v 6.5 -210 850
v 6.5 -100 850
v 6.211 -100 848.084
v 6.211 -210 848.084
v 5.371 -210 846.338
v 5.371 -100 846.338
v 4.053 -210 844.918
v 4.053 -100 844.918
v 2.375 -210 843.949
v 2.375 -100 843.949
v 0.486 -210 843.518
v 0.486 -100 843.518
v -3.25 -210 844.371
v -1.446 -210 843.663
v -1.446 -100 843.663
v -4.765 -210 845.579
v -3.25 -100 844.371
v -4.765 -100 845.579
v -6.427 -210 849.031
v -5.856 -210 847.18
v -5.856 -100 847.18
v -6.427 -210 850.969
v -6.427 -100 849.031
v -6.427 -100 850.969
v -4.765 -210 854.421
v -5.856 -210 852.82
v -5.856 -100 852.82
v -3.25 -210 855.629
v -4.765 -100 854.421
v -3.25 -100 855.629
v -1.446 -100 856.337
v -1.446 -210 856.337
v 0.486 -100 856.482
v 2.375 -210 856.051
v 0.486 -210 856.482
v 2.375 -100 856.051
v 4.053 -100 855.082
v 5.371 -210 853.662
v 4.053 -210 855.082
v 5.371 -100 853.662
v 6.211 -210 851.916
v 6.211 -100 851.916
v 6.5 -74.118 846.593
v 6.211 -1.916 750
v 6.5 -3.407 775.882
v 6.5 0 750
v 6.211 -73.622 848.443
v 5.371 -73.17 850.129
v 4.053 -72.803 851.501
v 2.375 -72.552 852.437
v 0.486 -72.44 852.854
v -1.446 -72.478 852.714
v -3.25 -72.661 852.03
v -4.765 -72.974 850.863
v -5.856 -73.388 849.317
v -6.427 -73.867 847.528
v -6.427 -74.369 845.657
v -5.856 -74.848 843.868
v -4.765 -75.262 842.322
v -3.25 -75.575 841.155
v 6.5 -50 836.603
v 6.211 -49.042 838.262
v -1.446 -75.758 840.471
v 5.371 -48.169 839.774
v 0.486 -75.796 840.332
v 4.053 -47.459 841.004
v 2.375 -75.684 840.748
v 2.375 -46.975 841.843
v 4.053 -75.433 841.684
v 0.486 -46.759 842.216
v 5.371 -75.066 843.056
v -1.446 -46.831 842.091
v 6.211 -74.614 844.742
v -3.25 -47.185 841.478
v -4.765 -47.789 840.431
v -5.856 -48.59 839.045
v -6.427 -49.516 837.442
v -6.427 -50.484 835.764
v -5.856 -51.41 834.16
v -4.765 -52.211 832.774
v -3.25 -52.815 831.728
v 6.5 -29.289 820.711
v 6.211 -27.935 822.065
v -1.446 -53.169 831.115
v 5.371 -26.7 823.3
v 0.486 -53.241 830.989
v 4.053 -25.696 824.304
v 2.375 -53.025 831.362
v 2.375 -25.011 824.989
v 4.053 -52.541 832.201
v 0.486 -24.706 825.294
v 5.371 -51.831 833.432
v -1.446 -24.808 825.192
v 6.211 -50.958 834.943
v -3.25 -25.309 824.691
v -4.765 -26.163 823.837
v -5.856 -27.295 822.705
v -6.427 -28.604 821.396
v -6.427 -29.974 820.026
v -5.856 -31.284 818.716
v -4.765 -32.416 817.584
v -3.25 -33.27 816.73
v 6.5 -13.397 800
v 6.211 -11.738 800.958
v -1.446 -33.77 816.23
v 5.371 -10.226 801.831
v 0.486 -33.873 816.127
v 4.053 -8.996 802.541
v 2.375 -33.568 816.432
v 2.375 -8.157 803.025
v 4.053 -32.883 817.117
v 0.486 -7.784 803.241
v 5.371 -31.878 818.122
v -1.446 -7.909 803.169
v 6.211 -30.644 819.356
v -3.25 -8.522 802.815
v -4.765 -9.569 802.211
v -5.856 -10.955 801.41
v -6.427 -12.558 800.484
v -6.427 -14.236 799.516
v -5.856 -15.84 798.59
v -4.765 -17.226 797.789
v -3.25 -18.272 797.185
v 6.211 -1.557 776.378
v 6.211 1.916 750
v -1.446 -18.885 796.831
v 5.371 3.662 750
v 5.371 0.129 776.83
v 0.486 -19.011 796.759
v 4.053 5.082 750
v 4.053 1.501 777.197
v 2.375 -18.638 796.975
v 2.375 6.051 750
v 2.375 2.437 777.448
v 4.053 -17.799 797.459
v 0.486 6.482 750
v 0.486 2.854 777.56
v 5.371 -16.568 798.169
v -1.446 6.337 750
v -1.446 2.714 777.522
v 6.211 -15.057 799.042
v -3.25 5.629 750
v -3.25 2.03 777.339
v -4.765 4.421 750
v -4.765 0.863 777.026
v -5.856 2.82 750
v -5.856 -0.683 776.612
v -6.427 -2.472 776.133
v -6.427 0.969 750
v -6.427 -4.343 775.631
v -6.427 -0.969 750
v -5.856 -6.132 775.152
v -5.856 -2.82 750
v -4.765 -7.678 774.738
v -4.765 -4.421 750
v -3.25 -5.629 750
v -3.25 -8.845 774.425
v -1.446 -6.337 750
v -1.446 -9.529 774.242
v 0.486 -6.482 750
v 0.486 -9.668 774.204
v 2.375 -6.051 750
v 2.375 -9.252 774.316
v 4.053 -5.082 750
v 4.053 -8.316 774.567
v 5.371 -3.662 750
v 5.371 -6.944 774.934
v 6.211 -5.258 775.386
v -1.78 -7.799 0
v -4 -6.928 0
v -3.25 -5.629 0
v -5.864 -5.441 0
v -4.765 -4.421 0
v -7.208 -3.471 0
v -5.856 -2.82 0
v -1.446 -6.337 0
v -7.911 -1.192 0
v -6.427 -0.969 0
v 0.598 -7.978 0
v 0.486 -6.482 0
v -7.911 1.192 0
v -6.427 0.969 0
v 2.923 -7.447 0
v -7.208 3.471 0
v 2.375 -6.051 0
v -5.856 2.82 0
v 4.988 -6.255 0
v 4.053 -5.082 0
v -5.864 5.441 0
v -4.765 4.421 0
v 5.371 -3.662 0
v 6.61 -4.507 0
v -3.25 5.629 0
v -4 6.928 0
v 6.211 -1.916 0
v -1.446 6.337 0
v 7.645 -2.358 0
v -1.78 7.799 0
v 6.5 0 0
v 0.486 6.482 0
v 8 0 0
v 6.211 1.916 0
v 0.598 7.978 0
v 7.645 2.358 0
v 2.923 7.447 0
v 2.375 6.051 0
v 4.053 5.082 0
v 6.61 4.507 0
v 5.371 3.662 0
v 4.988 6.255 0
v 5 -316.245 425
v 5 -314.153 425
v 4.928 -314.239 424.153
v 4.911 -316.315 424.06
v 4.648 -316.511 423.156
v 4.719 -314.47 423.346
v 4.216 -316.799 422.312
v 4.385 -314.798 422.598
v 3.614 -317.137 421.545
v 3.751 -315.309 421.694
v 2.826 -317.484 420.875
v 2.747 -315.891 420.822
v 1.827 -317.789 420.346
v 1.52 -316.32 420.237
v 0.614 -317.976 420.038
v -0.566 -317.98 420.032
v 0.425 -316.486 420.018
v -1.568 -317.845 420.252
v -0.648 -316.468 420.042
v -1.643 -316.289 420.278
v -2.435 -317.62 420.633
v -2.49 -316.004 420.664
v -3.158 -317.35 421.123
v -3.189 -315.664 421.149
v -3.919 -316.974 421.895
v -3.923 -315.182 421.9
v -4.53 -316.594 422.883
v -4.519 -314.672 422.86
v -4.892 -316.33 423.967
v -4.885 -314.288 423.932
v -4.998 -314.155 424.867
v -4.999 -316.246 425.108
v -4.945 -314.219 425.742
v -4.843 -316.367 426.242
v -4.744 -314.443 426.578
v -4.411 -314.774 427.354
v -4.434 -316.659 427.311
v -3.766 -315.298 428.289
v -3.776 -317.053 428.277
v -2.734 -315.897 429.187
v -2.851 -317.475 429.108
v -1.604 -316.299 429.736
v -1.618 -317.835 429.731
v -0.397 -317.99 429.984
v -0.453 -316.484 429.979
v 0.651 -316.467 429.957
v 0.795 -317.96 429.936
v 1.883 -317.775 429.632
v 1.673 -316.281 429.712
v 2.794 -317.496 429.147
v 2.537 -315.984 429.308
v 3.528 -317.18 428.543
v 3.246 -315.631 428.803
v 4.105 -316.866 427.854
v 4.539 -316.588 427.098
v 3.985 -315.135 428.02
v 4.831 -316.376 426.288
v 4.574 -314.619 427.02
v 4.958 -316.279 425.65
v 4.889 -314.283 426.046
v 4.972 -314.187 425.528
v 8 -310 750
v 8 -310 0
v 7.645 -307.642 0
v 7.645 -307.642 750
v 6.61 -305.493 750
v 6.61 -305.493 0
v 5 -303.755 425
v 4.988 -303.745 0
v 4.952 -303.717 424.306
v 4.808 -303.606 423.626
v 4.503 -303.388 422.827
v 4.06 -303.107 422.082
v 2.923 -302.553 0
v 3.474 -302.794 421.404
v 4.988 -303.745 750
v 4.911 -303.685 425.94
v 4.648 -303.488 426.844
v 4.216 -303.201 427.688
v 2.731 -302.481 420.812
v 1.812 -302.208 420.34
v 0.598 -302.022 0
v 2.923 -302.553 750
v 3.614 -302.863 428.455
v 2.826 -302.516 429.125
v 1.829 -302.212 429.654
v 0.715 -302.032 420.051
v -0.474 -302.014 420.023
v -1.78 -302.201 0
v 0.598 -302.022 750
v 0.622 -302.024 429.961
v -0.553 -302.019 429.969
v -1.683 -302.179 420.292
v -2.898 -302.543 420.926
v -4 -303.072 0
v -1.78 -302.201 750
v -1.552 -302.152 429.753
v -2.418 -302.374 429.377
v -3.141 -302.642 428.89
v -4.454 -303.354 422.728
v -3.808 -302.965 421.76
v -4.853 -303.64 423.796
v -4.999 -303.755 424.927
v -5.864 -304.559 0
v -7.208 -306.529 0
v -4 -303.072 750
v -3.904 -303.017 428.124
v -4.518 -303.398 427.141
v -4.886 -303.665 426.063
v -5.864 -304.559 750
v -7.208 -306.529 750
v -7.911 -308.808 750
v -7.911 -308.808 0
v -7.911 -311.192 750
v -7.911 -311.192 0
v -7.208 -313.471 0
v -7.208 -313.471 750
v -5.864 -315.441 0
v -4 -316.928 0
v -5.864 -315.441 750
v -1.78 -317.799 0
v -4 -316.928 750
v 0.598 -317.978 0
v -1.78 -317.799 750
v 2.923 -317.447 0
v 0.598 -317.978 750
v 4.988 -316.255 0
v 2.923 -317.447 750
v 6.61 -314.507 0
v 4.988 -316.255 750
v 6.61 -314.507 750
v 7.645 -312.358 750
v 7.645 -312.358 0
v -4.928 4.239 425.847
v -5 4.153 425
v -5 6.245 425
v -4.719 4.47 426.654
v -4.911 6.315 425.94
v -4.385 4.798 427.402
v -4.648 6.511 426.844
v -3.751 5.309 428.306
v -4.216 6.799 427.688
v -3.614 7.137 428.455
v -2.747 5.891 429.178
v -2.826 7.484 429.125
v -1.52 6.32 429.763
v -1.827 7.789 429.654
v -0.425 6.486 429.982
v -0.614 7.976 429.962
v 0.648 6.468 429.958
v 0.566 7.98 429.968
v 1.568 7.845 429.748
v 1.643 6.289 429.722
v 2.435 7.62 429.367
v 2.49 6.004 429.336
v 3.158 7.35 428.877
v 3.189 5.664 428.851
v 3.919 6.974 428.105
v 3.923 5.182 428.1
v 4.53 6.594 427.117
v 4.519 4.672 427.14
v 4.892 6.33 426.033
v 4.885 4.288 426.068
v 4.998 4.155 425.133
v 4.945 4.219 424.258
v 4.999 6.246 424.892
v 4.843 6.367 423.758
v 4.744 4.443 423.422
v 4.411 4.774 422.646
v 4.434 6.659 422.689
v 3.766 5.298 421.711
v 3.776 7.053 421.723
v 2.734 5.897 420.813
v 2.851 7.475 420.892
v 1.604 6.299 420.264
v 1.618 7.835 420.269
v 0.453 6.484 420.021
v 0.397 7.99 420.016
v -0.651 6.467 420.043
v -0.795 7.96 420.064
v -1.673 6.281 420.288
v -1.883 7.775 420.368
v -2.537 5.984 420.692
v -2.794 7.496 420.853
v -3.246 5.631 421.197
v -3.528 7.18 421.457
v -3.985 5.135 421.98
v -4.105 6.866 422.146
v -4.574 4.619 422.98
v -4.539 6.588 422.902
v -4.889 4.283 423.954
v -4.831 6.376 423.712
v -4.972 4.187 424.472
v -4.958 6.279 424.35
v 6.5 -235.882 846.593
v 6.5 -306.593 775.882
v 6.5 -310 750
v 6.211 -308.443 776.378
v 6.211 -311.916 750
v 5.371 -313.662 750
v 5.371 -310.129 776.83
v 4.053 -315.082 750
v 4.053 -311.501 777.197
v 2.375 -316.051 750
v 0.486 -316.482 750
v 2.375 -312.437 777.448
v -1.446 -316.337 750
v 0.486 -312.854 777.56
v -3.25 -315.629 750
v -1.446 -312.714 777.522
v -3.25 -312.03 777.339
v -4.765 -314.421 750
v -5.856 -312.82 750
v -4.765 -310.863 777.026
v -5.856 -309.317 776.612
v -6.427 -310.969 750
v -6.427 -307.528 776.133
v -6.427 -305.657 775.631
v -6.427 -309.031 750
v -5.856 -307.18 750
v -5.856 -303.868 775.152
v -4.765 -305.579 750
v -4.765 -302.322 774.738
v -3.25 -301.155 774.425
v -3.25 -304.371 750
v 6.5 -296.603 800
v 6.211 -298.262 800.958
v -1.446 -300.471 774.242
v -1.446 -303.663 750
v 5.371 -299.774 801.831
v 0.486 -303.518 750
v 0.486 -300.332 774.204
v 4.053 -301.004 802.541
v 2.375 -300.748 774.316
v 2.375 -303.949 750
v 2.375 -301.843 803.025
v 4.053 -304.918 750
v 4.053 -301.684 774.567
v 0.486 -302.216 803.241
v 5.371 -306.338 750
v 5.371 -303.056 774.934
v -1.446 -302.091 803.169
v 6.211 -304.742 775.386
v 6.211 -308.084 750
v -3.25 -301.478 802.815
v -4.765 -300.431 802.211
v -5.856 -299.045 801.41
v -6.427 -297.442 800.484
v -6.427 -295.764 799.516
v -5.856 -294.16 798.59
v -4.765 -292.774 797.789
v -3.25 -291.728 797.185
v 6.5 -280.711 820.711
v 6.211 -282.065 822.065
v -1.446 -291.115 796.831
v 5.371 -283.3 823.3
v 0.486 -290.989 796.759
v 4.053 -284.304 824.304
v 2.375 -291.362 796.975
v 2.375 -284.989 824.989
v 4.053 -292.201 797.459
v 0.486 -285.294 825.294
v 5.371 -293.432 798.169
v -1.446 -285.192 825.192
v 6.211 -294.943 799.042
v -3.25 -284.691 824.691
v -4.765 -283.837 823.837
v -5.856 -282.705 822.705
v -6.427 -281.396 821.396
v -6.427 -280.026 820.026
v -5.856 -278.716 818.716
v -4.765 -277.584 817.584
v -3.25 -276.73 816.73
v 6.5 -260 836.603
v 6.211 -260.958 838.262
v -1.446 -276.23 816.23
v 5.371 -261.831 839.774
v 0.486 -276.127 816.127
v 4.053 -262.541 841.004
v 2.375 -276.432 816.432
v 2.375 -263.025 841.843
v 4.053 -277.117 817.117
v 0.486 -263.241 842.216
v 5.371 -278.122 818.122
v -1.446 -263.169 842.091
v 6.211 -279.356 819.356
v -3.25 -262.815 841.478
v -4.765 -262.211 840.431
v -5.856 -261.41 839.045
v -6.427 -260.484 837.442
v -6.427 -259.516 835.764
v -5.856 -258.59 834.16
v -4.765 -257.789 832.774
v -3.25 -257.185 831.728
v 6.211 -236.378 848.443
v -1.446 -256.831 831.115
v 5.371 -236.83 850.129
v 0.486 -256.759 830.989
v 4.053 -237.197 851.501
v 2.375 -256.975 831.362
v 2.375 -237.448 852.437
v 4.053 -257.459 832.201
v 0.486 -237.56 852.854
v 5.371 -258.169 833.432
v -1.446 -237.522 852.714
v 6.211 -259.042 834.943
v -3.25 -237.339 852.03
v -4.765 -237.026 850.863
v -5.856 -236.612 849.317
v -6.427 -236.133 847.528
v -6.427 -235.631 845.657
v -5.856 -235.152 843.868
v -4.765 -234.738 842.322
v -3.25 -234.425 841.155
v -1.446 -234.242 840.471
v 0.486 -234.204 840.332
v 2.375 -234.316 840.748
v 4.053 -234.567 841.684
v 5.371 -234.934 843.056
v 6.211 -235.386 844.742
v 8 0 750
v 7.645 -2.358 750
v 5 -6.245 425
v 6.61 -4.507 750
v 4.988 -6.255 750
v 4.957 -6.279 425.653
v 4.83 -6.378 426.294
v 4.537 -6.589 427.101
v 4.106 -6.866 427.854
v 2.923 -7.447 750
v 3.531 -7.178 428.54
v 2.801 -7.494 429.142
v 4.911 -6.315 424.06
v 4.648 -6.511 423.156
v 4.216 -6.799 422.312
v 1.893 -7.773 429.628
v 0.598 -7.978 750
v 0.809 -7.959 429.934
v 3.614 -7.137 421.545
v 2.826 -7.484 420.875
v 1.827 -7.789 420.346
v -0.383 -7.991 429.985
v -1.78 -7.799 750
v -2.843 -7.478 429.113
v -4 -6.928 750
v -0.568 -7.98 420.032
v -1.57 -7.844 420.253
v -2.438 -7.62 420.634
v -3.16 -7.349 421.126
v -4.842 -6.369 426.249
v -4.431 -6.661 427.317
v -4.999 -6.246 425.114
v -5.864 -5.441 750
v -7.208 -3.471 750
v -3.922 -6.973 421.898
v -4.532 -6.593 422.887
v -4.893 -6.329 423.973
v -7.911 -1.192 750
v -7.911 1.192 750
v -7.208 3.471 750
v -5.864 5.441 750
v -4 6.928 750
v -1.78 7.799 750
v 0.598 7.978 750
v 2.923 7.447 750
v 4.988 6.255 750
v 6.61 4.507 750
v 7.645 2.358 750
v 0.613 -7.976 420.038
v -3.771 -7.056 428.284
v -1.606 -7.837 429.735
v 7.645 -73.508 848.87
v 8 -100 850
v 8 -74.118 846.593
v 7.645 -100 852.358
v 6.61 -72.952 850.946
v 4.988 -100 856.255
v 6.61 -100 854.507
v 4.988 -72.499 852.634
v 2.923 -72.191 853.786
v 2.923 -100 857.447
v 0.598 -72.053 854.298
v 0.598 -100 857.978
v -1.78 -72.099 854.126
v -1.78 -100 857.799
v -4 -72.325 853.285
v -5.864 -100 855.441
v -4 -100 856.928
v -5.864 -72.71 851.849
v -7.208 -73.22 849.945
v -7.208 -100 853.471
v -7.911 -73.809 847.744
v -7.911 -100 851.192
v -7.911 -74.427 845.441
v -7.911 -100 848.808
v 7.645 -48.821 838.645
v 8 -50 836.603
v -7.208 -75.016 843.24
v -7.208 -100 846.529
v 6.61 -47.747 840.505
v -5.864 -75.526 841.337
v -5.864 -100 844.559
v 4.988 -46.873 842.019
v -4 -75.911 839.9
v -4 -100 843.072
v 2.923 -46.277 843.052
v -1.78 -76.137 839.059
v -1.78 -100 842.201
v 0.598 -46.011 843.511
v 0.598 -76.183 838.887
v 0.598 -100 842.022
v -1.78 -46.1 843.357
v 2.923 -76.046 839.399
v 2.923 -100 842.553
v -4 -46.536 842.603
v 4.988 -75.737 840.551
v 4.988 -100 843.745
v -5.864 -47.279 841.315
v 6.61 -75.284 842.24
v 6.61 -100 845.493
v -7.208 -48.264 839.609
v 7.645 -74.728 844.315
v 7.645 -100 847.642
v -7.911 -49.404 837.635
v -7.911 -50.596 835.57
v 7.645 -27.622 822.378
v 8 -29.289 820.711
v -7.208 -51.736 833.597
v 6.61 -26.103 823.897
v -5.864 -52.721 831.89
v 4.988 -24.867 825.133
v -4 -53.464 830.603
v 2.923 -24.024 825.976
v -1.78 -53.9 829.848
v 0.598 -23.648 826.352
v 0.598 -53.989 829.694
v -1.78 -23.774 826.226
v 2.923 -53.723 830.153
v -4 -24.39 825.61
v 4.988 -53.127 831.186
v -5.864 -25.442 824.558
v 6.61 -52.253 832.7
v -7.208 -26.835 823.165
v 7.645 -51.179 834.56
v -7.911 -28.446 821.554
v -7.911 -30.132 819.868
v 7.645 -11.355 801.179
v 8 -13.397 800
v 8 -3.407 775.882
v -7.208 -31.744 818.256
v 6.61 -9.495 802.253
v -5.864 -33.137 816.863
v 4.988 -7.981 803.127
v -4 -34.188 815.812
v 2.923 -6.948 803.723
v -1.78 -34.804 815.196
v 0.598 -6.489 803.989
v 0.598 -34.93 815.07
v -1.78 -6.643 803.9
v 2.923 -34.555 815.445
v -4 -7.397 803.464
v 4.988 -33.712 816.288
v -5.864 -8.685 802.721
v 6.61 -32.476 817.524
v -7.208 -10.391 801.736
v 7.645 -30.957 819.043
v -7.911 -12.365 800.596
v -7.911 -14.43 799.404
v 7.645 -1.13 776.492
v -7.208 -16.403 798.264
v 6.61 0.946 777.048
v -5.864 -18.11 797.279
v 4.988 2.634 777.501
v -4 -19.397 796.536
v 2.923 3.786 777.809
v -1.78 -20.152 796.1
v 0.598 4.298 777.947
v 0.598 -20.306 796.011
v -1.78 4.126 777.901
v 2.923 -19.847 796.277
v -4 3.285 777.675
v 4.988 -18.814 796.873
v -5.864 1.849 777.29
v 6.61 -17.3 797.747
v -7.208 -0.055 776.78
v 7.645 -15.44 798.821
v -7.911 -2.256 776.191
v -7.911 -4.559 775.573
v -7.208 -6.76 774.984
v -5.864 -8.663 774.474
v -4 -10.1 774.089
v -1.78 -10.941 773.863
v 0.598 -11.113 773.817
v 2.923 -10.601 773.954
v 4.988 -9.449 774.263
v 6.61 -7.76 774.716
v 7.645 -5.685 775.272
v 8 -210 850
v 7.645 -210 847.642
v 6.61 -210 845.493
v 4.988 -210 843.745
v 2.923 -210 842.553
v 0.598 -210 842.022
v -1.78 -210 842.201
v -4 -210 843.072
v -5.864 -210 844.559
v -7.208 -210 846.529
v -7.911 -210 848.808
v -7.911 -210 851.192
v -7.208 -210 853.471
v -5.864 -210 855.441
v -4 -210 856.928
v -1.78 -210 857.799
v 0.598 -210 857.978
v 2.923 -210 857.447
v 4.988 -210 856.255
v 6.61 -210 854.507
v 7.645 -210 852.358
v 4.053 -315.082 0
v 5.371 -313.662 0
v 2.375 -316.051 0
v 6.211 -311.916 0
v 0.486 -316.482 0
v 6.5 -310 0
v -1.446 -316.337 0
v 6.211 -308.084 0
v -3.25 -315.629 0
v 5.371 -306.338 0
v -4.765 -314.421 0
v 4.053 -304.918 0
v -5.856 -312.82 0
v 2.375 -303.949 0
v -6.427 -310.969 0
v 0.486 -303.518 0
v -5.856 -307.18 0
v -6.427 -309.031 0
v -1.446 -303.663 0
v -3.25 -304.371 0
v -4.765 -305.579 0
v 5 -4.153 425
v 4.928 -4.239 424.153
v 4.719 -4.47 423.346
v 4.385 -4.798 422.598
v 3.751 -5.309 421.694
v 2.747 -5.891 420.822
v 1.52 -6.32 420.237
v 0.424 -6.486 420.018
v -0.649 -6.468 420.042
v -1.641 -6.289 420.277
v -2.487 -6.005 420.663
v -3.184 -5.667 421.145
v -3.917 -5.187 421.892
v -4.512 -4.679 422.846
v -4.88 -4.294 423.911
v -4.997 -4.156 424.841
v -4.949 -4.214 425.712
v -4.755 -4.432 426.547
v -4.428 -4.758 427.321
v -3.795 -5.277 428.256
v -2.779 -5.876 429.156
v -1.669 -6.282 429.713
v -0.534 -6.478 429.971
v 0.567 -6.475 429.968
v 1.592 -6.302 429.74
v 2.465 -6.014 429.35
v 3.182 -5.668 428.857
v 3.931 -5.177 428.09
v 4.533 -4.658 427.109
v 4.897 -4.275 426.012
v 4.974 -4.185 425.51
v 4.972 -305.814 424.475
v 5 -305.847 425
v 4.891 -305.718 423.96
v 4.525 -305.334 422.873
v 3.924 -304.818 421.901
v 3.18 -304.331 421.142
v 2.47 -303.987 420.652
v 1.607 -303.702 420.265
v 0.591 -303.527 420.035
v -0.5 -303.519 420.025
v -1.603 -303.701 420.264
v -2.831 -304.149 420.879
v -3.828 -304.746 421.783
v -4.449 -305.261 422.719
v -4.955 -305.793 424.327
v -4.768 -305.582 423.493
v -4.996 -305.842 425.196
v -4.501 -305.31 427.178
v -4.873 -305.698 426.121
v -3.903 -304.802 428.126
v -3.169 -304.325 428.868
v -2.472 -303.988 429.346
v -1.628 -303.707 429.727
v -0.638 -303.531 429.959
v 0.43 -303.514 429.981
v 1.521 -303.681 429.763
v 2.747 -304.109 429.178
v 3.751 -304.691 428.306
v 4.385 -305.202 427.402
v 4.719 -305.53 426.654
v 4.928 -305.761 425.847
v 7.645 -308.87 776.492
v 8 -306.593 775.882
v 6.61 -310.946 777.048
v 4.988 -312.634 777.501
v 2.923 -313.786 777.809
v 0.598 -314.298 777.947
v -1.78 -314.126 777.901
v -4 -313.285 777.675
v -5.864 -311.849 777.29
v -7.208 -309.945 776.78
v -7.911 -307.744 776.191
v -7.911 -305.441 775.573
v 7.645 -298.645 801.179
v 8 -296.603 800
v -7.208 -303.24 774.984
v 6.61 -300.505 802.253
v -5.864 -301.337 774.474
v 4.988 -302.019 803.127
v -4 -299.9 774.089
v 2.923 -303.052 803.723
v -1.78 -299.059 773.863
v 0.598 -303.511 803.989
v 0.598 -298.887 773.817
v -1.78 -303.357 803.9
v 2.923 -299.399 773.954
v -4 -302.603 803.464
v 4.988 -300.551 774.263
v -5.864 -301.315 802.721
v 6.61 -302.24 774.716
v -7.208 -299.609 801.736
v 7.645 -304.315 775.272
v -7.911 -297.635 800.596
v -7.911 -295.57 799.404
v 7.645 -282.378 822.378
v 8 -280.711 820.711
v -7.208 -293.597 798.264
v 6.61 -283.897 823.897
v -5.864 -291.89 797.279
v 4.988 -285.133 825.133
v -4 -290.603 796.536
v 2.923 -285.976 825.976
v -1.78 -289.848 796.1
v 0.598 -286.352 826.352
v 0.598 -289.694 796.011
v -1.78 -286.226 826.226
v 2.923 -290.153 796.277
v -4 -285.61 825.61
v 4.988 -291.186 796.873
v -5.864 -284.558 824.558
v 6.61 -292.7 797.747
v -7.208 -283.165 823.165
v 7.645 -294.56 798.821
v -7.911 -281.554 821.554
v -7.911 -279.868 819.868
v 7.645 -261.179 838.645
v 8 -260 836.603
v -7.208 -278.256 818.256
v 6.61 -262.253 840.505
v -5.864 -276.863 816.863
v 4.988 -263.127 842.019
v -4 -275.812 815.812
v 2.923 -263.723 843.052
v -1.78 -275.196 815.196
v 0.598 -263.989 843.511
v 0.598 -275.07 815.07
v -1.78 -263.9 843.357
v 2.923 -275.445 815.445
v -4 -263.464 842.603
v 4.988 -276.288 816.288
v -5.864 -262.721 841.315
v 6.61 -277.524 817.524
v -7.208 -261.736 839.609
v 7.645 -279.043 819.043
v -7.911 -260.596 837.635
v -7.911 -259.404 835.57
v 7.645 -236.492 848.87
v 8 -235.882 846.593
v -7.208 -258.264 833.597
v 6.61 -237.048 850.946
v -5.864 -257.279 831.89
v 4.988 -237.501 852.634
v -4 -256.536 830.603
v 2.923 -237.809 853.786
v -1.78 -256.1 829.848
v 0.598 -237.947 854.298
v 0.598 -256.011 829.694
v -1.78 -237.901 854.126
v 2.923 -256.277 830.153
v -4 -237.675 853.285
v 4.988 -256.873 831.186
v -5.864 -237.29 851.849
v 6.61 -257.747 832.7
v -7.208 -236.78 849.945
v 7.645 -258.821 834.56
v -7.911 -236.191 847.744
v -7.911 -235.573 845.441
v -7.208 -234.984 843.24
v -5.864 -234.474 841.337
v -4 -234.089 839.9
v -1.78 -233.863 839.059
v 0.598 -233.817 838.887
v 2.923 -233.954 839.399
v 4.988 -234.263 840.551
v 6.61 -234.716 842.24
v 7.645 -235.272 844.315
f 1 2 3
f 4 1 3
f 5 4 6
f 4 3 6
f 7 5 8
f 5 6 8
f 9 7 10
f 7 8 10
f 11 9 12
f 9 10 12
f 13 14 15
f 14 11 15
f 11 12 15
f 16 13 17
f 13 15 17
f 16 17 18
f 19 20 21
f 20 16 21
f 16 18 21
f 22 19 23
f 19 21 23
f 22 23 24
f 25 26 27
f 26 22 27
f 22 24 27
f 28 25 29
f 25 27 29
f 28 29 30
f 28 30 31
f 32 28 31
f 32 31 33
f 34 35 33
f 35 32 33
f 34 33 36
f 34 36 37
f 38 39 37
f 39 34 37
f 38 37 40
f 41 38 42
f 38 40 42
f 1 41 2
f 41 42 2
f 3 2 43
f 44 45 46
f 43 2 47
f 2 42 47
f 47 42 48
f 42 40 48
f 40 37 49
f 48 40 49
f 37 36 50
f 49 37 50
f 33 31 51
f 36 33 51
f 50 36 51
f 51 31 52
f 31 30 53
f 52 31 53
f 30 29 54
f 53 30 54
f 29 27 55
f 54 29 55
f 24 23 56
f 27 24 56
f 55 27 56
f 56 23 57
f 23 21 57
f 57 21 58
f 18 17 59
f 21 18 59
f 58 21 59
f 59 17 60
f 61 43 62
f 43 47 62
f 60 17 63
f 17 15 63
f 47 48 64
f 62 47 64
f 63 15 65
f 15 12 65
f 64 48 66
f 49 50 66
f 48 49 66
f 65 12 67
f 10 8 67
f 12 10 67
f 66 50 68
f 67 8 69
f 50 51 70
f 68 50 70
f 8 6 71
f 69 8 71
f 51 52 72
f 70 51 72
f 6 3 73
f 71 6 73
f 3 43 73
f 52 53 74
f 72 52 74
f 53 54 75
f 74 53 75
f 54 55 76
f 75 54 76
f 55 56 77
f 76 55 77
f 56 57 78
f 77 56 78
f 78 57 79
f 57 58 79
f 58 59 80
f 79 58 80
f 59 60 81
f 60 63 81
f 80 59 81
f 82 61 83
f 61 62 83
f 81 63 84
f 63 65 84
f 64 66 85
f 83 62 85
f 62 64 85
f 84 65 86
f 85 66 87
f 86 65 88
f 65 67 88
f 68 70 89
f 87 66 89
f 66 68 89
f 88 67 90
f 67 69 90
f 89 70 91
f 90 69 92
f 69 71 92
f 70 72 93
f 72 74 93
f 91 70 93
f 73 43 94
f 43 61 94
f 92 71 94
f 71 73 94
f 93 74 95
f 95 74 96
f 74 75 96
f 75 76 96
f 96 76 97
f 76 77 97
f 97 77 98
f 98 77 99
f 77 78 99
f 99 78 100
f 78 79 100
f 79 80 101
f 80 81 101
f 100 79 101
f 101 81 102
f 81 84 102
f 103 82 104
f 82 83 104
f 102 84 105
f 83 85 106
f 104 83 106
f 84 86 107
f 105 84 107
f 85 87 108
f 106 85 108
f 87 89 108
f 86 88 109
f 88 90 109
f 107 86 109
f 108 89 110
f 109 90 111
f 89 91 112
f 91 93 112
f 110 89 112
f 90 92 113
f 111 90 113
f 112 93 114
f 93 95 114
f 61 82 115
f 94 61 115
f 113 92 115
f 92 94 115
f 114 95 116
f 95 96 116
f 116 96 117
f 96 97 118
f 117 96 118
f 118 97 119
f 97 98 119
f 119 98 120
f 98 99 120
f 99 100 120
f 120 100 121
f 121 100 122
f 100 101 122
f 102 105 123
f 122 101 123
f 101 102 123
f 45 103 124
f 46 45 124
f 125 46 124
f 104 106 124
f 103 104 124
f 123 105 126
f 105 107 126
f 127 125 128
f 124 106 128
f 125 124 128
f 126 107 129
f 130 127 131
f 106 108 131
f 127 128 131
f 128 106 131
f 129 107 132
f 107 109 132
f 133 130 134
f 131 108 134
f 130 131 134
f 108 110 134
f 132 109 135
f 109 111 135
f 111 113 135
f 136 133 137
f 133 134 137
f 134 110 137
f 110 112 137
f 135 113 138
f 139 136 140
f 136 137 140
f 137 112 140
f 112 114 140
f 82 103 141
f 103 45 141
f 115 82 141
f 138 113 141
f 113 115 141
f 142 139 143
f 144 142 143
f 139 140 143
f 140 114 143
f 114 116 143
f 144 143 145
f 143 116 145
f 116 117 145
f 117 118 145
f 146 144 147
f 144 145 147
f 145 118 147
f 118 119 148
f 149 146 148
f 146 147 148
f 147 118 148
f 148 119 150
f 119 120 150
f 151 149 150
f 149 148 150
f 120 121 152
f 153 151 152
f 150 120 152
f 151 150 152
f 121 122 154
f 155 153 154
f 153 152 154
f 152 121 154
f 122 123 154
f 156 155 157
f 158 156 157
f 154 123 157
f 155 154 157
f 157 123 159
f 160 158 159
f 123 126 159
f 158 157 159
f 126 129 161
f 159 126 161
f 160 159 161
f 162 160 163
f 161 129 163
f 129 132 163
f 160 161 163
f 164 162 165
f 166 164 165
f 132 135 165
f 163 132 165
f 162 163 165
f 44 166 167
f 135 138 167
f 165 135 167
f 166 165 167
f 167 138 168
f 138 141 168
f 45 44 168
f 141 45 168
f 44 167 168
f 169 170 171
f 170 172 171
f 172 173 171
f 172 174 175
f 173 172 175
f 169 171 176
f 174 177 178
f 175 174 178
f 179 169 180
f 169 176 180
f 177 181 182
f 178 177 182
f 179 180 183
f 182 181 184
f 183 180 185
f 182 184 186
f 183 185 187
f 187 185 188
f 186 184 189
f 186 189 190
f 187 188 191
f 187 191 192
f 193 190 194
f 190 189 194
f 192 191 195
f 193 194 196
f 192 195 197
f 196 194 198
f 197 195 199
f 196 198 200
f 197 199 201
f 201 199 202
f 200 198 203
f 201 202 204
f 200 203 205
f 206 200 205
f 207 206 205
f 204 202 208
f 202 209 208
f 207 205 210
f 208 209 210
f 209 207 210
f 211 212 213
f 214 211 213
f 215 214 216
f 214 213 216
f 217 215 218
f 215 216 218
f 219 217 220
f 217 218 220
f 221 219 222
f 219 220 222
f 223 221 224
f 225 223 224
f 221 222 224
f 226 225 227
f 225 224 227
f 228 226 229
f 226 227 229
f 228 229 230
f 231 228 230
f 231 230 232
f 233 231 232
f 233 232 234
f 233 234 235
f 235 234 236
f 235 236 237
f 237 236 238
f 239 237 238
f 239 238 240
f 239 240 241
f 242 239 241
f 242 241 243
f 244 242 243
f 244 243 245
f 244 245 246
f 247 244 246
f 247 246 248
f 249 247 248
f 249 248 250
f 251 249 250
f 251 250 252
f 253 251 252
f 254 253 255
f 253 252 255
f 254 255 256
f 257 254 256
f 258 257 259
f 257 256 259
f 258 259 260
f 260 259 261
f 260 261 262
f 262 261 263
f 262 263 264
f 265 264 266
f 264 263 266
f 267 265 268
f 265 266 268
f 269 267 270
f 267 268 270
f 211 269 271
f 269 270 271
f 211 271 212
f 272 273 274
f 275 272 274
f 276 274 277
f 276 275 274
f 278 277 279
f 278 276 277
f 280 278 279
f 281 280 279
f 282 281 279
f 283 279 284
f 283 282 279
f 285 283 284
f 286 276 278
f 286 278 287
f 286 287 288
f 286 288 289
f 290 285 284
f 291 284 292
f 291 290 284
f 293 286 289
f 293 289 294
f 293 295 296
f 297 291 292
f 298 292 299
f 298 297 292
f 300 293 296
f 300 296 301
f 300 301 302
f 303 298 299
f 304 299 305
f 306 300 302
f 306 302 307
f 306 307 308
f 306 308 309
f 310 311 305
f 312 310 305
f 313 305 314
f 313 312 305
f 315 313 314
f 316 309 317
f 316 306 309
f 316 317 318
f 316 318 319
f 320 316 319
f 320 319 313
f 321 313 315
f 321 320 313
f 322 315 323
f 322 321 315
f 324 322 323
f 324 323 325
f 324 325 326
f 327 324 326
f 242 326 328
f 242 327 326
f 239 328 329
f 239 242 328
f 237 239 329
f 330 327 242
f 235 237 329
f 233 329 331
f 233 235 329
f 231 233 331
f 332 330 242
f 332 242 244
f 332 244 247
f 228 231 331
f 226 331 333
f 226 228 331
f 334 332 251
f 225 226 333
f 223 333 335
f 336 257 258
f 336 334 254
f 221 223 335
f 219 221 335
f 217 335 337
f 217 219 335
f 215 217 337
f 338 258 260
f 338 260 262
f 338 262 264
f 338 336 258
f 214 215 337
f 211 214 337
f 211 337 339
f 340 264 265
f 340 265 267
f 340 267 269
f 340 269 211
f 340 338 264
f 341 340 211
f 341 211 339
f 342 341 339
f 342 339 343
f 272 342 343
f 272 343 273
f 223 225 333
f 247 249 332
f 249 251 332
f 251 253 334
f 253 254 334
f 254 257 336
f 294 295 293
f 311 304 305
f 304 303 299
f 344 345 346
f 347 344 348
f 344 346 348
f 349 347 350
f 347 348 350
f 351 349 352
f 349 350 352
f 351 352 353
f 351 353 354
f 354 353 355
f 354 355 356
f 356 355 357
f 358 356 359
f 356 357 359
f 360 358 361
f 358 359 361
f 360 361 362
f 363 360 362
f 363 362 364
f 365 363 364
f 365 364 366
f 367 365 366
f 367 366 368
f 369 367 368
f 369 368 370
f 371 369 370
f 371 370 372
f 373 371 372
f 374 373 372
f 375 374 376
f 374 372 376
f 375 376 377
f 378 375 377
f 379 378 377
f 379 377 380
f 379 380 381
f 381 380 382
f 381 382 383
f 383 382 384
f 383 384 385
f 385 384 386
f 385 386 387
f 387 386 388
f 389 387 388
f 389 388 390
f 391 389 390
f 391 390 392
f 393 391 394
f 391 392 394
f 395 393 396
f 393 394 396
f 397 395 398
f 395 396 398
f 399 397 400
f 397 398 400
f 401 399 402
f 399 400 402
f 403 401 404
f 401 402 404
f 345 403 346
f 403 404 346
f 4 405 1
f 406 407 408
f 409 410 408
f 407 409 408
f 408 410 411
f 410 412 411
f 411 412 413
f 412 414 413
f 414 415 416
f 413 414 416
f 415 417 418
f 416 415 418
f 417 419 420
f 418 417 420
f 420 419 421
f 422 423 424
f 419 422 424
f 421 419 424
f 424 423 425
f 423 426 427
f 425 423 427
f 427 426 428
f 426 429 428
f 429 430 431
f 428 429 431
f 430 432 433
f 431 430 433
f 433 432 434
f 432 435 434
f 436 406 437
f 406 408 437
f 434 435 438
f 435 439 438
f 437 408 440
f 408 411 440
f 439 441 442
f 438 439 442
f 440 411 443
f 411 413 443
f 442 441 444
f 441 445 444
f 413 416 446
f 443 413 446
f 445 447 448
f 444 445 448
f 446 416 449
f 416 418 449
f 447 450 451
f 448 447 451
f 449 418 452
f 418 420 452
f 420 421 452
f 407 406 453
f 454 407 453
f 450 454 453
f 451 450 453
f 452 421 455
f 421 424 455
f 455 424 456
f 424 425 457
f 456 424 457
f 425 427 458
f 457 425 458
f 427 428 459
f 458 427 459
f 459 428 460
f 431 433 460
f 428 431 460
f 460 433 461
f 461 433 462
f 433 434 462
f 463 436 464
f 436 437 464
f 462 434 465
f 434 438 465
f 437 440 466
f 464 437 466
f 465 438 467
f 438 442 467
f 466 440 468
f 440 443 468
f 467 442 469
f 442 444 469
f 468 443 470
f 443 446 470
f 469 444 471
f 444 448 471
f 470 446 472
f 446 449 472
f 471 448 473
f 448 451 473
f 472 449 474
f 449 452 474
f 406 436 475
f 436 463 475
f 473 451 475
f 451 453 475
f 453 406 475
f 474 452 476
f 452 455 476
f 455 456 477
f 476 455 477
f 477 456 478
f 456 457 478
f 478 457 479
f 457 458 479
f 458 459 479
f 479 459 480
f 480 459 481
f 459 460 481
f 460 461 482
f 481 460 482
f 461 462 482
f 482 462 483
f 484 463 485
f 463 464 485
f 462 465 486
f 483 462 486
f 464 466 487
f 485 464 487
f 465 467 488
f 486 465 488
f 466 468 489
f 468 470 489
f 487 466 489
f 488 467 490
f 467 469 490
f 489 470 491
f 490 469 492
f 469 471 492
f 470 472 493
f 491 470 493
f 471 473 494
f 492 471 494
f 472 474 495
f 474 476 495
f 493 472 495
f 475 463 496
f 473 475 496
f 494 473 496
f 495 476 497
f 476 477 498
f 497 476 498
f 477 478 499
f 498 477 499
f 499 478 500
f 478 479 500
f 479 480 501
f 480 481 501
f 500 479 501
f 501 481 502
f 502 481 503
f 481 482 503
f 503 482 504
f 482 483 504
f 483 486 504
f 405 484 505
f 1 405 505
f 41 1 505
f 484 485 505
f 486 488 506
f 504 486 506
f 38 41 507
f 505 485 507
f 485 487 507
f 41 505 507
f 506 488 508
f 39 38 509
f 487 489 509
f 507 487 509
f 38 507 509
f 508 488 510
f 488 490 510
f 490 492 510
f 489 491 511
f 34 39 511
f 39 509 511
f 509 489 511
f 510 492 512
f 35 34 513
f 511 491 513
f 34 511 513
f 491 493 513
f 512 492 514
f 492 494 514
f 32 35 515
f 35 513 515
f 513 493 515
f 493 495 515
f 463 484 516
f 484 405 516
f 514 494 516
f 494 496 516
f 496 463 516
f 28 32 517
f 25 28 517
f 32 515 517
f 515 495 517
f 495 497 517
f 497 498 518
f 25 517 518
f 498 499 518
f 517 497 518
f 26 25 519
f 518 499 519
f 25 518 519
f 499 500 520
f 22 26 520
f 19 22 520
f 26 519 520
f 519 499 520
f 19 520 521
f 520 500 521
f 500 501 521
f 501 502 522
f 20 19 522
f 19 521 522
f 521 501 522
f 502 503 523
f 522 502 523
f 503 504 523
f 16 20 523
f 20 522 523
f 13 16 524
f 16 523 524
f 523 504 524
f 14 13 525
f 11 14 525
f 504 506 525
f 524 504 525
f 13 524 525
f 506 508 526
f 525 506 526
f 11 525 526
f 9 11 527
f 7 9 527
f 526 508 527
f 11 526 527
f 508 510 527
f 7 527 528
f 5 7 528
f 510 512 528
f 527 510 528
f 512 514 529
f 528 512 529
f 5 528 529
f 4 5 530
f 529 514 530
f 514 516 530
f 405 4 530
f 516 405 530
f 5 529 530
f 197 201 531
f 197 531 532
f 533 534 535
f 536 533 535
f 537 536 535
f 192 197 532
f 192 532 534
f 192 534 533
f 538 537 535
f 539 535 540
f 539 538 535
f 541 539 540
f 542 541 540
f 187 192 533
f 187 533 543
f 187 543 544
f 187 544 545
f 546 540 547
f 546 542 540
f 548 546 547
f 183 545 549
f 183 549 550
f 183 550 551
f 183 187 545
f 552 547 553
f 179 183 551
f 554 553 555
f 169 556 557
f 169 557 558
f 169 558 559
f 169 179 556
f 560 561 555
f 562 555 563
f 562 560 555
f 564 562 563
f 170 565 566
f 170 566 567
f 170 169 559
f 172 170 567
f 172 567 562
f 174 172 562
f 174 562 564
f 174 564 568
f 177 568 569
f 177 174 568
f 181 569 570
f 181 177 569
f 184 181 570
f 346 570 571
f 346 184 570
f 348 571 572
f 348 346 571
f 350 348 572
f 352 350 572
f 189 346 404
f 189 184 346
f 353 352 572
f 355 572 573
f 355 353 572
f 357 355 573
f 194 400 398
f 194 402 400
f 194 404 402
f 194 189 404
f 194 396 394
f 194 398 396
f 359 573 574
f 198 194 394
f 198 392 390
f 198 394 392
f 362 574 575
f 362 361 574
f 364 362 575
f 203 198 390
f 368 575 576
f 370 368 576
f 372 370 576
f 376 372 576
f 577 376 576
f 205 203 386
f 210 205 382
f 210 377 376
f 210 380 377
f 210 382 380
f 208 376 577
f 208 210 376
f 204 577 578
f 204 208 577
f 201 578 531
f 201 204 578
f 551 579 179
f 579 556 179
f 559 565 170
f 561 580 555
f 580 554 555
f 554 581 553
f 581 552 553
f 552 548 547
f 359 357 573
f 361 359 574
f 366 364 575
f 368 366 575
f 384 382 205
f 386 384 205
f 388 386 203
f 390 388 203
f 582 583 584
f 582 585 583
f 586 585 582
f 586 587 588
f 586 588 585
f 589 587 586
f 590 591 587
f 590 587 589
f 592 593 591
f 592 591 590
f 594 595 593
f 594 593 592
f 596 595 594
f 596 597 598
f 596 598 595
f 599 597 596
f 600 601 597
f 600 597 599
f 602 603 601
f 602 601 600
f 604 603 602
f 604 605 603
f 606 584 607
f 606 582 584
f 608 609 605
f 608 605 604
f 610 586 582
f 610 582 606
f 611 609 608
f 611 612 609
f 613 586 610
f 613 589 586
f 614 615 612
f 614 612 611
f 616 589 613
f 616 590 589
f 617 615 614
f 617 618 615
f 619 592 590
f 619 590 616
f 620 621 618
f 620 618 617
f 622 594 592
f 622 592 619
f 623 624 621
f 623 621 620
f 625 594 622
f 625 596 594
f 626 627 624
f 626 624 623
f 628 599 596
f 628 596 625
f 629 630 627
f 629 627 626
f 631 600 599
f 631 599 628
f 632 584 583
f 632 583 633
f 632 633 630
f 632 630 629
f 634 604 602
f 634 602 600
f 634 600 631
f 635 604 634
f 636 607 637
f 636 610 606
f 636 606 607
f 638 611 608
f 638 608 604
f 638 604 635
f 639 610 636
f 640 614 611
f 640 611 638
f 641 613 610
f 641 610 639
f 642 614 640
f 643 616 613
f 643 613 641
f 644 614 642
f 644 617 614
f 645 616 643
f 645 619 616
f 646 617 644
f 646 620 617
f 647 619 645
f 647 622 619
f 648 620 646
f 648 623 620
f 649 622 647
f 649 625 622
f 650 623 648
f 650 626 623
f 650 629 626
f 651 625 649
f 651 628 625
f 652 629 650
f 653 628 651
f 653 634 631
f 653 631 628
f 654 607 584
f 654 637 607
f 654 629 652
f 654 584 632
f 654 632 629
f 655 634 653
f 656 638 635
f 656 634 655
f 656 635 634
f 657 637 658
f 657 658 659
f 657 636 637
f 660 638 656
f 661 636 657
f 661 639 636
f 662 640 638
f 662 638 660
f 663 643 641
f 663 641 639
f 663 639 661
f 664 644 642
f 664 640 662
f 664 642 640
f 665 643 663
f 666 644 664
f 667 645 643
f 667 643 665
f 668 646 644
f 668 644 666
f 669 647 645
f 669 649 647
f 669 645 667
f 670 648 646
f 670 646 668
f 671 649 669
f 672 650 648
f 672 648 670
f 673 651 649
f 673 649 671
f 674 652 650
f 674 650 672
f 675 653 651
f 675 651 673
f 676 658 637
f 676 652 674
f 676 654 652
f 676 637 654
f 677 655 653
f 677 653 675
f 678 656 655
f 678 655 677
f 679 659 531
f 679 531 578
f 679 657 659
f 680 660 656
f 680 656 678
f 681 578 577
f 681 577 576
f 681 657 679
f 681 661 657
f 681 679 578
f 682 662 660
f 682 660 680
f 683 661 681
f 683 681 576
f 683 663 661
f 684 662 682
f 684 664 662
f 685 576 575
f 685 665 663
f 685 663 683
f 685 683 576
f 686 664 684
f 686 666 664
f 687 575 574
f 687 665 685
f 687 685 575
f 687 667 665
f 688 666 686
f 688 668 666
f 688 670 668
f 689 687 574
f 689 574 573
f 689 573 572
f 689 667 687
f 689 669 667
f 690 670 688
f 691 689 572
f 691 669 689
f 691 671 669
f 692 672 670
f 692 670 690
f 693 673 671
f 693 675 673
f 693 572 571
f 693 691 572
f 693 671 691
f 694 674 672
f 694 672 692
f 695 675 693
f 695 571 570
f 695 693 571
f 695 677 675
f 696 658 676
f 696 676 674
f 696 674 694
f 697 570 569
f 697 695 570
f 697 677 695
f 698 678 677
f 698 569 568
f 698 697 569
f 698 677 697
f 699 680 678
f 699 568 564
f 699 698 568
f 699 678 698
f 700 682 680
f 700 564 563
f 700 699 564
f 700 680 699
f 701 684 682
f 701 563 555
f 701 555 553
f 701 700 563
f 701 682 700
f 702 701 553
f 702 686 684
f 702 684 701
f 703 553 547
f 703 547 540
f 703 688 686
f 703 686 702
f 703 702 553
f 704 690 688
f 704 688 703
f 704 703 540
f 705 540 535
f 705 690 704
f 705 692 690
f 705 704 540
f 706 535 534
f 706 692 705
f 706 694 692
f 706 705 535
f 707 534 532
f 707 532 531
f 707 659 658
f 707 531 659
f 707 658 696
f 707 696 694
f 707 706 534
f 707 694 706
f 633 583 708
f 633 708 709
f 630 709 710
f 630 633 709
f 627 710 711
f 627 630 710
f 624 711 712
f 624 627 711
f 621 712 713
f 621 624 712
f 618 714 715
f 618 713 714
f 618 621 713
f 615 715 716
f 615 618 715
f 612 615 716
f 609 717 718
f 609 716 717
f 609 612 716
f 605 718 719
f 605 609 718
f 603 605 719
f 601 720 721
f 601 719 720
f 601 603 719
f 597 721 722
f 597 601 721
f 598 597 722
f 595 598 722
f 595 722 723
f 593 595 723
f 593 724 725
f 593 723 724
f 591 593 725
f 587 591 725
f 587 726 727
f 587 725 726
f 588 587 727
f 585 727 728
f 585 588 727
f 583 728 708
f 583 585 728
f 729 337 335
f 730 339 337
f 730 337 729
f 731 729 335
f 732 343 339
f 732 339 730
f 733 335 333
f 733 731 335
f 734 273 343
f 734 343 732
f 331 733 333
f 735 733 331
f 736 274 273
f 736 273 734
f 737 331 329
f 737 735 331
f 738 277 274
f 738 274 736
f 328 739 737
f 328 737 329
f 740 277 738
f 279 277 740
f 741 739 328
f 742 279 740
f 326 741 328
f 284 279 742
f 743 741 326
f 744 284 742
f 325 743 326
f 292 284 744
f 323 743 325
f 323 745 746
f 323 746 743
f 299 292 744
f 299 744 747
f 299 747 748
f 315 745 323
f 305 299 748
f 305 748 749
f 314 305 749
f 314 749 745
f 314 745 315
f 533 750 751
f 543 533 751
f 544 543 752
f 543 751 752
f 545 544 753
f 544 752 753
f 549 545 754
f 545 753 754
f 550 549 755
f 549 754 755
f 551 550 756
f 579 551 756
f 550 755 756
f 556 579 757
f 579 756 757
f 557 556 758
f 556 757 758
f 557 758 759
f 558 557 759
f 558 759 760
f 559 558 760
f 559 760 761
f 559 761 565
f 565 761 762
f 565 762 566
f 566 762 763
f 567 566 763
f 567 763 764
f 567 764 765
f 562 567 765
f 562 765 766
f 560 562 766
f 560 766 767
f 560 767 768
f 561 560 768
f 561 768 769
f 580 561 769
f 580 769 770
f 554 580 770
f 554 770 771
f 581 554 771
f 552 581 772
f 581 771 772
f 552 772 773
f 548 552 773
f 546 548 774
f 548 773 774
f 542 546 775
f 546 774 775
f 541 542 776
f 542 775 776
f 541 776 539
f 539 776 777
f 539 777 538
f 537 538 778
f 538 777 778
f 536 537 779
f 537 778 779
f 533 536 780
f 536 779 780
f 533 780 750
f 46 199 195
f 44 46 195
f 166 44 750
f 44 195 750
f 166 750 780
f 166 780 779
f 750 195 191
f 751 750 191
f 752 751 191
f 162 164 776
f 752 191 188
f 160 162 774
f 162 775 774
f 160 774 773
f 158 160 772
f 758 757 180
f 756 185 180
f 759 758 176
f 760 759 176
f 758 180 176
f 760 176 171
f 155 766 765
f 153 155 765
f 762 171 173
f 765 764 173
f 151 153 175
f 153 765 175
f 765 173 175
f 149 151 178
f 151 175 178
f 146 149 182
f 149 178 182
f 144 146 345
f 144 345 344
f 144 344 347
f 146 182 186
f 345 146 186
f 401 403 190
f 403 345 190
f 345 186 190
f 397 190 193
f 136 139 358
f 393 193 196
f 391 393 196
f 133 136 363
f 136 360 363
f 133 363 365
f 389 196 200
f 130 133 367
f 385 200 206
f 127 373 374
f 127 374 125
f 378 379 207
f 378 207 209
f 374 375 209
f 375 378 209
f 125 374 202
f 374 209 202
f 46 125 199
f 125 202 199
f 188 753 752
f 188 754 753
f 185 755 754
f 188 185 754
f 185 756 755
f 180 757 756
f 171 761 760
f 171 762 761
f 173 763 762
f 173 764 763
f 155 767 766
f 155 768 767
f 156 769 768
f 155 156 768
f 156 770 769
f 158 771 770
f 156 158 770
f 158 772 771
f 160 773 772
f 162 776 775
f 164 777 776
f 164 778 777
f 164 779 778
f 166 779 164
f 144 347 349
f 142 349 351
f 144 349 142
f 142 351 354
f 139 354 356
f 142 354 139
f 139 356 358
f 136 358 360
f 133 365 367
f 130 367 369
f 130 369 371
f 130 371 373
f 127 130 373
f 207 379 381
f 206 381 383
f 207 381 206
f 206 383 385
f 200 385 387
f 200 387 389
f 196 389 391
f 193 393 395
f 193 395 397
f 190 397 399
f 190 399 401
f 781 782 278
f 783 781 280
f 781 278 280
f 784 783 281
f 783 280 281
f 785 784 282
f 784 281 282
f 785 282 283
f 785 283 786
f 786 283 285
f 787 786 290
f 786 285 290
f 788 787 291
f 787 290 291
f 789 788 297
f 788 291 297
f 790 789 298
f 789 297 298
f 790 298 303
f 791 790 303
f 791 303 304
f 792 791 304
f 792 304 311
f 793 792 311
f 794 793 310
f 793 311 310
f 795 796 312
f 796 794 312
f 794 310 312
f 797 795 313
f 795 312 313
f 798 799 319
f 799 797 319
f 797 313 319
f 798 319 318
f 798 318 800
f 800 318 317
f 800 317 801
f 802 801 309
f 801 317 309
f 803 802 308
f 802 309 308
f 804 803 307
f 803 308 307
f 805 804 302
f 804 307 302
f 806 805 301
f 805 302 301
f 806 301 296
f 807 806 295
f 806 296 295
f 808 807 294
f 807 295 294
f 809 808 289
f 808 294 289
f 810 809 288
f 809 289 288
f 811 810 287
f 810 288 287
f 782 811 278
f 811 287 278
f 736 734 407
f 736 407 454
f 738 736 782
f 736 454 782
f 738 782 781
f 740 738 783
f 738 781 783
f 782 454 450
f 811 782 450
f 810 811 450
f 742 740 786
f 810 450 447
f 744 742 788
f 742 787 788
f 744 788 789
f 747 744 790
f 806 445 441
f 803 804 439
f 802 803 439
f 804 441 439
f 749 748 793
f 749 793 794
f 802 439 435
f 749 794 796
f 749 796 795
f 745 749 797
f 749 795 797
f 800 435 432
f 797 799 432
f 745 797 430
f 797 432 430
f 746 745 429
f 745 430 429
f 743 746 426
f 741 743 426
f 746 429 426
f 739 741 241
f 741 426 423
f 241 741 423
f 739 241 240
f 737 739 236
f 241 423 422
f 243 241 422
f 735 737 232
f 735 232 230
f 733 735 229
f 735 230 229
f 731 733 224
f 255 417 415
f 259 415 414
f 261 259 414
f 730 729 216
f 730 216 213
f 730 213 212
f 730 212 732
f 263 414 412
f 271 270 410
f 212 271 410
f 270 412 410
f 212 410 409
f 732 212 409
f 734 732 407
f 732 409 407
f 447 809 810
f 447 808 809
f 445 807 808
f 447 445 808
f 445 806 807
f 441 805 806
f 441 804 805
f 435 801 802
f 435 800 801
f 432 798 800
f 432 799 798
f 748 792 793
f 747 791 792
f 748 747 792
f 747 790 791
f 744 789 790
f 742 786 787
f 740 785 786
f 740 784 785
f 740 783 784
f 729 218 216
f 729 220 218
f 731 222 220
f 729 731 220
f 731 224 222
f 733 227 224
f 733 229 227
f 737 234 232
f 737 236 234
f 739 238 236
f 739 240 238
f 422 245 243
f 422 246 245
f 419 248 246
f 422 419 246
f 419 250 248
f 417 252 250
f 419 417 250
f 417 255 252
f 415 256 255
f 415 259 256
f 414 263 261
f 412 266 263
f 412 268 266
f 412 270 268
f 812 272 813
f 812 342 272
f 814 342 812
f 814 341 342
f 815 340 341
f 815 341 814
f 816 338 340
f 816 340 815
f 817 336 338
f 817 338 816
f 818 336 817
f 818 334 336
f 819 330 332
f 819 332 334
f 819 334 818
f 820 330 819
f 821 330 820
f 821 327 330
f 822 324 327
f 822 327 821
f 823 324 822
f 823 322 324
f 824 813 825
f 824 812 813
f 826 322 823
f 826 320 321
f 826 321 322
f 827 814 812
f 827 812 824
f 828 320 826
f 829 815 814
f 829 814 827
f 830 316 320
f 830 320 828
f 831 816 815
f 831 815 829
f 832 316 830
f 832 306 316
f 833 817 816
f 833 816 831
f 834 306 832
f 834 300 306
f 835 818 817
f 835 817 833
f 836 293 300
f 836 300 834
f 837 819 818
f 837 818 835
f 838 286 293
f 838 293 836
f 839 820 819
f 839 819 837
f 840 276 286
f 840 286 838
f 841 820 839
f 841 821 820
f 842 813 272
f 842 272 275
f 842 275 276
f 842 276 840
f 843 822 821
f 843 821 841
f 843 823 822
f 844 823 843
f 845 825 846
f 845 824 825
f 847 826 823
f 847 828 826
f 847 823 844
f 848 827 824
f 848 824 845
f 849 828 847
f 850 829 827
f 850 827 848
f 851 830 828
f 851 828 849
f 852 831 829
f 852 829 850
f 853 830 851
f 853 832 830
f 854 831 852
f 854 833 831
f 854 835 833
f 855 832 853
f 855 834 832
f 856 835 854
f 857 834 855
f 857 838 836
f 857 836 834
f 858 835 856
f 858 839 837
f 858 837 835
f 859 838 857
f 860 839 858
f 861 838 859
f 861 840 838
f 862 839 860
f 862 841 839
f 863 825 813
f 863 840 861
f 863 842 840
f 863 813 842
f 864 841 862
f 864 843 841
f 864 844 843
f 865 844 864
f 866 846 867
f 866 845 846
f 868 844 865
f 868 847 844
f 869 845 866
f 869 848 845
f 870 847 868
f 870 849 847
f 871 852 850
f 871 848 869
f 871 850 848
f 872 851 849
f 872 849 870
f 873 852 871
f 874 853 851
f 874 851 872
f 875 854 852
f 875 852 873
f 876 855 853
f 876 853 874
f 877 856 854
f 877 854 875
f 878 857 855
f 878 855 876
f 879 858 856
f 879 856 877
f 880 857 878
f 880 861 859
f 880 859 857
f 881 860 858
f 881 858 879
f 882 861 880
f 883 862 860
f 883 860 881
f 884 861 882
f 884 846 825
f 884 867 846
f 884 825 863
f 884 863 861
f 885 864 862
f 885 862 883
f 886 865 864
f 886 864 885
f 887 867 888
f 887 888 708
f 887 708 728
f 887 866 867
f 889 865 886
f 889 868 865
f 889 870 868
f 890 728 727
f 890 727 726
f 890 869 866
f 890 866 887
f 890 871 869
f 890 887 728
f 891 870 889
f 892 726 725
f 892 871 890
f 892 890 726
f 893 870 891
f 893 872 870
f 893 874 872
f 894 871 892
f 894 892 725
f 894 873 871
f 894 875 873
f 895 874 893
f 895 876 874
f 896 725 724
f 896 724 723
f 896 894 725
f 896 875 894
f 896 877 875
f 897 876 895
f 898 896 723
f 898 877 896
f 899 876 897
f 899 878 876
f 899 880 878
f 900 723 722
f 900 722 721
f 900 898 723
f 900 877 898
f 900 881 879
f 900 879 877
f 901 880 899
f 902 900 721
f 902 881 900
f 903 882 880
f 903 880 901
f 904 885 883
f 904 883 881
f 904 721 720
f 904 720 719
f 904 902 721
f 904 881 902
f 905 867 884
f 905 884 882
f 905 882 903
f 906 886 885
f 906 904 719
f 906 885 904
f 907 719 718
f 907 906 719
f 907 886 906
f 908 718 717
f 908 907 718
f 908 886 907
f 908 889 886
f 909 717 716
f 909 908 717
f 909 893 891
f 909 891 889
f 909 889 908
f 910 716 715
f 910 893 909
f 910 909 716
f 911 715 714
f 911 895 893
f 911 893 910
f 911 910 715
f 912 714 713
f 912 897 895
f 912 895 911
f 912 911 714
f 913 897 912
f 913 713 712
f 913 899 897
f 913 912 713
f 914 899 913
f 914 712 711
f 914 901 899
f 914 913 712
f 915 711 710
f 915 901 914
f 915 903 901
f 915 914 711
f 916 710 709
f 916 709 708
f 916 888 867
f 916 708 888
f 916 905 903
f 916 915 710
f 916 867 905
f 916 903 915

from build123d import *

# Parameters (mm, degrees)
F1_R     = 8
F3_T     = -1.5
F5_D     = 10
F5_DEPTH = 318.0010001
F6_D     = 10


with BuildPart() as f2:
    # F2: sweep along a path in F0
    with BuildLine(Plane.YZ) as f2_path:
        Line((-310, 0), (-310, 750))
        ThreePointArc((-310, 750), (-280.7106781187, 820.7106781187), (-210, 850))
        Line((-210, 850), (-100, 850))
        ThreePointArc((-100, 850), (-29.2893218813, 820.7106781187), (0, 750))
        Line((0, 750), (0, 0))
    # F1 (on Top) → F2 (sweep)
    with BuildSketch(Plane.XY):
        Circle(F1_R)
    sweep(path=f2_path.line)

    # F3
    f3_openings = [f2.faces().sort_by_distance(p)[0] for p in [
        (0, -310, 0),
        (0, 0, 0),
    ]]
    offset(amount=F3_T, openings=f3_openings)

    # F5 (through all, one way)
    with BuildSketch(Plane(origin=(0, 0, 0), x_dir=(1, 0, 0), z_dir=(0, 1, 0))):
        with Locations((0, -425)):
            Circle(F5_D / 2)
    extrude(amount=-F5_DEPTH, mode=Mode.SUBTRACT)

    # F6 (through all)
    with Locations(Plane.XZ):
        with Locations((0, 425)):
            Hole(F6_D / 2)


solid = f2.part
